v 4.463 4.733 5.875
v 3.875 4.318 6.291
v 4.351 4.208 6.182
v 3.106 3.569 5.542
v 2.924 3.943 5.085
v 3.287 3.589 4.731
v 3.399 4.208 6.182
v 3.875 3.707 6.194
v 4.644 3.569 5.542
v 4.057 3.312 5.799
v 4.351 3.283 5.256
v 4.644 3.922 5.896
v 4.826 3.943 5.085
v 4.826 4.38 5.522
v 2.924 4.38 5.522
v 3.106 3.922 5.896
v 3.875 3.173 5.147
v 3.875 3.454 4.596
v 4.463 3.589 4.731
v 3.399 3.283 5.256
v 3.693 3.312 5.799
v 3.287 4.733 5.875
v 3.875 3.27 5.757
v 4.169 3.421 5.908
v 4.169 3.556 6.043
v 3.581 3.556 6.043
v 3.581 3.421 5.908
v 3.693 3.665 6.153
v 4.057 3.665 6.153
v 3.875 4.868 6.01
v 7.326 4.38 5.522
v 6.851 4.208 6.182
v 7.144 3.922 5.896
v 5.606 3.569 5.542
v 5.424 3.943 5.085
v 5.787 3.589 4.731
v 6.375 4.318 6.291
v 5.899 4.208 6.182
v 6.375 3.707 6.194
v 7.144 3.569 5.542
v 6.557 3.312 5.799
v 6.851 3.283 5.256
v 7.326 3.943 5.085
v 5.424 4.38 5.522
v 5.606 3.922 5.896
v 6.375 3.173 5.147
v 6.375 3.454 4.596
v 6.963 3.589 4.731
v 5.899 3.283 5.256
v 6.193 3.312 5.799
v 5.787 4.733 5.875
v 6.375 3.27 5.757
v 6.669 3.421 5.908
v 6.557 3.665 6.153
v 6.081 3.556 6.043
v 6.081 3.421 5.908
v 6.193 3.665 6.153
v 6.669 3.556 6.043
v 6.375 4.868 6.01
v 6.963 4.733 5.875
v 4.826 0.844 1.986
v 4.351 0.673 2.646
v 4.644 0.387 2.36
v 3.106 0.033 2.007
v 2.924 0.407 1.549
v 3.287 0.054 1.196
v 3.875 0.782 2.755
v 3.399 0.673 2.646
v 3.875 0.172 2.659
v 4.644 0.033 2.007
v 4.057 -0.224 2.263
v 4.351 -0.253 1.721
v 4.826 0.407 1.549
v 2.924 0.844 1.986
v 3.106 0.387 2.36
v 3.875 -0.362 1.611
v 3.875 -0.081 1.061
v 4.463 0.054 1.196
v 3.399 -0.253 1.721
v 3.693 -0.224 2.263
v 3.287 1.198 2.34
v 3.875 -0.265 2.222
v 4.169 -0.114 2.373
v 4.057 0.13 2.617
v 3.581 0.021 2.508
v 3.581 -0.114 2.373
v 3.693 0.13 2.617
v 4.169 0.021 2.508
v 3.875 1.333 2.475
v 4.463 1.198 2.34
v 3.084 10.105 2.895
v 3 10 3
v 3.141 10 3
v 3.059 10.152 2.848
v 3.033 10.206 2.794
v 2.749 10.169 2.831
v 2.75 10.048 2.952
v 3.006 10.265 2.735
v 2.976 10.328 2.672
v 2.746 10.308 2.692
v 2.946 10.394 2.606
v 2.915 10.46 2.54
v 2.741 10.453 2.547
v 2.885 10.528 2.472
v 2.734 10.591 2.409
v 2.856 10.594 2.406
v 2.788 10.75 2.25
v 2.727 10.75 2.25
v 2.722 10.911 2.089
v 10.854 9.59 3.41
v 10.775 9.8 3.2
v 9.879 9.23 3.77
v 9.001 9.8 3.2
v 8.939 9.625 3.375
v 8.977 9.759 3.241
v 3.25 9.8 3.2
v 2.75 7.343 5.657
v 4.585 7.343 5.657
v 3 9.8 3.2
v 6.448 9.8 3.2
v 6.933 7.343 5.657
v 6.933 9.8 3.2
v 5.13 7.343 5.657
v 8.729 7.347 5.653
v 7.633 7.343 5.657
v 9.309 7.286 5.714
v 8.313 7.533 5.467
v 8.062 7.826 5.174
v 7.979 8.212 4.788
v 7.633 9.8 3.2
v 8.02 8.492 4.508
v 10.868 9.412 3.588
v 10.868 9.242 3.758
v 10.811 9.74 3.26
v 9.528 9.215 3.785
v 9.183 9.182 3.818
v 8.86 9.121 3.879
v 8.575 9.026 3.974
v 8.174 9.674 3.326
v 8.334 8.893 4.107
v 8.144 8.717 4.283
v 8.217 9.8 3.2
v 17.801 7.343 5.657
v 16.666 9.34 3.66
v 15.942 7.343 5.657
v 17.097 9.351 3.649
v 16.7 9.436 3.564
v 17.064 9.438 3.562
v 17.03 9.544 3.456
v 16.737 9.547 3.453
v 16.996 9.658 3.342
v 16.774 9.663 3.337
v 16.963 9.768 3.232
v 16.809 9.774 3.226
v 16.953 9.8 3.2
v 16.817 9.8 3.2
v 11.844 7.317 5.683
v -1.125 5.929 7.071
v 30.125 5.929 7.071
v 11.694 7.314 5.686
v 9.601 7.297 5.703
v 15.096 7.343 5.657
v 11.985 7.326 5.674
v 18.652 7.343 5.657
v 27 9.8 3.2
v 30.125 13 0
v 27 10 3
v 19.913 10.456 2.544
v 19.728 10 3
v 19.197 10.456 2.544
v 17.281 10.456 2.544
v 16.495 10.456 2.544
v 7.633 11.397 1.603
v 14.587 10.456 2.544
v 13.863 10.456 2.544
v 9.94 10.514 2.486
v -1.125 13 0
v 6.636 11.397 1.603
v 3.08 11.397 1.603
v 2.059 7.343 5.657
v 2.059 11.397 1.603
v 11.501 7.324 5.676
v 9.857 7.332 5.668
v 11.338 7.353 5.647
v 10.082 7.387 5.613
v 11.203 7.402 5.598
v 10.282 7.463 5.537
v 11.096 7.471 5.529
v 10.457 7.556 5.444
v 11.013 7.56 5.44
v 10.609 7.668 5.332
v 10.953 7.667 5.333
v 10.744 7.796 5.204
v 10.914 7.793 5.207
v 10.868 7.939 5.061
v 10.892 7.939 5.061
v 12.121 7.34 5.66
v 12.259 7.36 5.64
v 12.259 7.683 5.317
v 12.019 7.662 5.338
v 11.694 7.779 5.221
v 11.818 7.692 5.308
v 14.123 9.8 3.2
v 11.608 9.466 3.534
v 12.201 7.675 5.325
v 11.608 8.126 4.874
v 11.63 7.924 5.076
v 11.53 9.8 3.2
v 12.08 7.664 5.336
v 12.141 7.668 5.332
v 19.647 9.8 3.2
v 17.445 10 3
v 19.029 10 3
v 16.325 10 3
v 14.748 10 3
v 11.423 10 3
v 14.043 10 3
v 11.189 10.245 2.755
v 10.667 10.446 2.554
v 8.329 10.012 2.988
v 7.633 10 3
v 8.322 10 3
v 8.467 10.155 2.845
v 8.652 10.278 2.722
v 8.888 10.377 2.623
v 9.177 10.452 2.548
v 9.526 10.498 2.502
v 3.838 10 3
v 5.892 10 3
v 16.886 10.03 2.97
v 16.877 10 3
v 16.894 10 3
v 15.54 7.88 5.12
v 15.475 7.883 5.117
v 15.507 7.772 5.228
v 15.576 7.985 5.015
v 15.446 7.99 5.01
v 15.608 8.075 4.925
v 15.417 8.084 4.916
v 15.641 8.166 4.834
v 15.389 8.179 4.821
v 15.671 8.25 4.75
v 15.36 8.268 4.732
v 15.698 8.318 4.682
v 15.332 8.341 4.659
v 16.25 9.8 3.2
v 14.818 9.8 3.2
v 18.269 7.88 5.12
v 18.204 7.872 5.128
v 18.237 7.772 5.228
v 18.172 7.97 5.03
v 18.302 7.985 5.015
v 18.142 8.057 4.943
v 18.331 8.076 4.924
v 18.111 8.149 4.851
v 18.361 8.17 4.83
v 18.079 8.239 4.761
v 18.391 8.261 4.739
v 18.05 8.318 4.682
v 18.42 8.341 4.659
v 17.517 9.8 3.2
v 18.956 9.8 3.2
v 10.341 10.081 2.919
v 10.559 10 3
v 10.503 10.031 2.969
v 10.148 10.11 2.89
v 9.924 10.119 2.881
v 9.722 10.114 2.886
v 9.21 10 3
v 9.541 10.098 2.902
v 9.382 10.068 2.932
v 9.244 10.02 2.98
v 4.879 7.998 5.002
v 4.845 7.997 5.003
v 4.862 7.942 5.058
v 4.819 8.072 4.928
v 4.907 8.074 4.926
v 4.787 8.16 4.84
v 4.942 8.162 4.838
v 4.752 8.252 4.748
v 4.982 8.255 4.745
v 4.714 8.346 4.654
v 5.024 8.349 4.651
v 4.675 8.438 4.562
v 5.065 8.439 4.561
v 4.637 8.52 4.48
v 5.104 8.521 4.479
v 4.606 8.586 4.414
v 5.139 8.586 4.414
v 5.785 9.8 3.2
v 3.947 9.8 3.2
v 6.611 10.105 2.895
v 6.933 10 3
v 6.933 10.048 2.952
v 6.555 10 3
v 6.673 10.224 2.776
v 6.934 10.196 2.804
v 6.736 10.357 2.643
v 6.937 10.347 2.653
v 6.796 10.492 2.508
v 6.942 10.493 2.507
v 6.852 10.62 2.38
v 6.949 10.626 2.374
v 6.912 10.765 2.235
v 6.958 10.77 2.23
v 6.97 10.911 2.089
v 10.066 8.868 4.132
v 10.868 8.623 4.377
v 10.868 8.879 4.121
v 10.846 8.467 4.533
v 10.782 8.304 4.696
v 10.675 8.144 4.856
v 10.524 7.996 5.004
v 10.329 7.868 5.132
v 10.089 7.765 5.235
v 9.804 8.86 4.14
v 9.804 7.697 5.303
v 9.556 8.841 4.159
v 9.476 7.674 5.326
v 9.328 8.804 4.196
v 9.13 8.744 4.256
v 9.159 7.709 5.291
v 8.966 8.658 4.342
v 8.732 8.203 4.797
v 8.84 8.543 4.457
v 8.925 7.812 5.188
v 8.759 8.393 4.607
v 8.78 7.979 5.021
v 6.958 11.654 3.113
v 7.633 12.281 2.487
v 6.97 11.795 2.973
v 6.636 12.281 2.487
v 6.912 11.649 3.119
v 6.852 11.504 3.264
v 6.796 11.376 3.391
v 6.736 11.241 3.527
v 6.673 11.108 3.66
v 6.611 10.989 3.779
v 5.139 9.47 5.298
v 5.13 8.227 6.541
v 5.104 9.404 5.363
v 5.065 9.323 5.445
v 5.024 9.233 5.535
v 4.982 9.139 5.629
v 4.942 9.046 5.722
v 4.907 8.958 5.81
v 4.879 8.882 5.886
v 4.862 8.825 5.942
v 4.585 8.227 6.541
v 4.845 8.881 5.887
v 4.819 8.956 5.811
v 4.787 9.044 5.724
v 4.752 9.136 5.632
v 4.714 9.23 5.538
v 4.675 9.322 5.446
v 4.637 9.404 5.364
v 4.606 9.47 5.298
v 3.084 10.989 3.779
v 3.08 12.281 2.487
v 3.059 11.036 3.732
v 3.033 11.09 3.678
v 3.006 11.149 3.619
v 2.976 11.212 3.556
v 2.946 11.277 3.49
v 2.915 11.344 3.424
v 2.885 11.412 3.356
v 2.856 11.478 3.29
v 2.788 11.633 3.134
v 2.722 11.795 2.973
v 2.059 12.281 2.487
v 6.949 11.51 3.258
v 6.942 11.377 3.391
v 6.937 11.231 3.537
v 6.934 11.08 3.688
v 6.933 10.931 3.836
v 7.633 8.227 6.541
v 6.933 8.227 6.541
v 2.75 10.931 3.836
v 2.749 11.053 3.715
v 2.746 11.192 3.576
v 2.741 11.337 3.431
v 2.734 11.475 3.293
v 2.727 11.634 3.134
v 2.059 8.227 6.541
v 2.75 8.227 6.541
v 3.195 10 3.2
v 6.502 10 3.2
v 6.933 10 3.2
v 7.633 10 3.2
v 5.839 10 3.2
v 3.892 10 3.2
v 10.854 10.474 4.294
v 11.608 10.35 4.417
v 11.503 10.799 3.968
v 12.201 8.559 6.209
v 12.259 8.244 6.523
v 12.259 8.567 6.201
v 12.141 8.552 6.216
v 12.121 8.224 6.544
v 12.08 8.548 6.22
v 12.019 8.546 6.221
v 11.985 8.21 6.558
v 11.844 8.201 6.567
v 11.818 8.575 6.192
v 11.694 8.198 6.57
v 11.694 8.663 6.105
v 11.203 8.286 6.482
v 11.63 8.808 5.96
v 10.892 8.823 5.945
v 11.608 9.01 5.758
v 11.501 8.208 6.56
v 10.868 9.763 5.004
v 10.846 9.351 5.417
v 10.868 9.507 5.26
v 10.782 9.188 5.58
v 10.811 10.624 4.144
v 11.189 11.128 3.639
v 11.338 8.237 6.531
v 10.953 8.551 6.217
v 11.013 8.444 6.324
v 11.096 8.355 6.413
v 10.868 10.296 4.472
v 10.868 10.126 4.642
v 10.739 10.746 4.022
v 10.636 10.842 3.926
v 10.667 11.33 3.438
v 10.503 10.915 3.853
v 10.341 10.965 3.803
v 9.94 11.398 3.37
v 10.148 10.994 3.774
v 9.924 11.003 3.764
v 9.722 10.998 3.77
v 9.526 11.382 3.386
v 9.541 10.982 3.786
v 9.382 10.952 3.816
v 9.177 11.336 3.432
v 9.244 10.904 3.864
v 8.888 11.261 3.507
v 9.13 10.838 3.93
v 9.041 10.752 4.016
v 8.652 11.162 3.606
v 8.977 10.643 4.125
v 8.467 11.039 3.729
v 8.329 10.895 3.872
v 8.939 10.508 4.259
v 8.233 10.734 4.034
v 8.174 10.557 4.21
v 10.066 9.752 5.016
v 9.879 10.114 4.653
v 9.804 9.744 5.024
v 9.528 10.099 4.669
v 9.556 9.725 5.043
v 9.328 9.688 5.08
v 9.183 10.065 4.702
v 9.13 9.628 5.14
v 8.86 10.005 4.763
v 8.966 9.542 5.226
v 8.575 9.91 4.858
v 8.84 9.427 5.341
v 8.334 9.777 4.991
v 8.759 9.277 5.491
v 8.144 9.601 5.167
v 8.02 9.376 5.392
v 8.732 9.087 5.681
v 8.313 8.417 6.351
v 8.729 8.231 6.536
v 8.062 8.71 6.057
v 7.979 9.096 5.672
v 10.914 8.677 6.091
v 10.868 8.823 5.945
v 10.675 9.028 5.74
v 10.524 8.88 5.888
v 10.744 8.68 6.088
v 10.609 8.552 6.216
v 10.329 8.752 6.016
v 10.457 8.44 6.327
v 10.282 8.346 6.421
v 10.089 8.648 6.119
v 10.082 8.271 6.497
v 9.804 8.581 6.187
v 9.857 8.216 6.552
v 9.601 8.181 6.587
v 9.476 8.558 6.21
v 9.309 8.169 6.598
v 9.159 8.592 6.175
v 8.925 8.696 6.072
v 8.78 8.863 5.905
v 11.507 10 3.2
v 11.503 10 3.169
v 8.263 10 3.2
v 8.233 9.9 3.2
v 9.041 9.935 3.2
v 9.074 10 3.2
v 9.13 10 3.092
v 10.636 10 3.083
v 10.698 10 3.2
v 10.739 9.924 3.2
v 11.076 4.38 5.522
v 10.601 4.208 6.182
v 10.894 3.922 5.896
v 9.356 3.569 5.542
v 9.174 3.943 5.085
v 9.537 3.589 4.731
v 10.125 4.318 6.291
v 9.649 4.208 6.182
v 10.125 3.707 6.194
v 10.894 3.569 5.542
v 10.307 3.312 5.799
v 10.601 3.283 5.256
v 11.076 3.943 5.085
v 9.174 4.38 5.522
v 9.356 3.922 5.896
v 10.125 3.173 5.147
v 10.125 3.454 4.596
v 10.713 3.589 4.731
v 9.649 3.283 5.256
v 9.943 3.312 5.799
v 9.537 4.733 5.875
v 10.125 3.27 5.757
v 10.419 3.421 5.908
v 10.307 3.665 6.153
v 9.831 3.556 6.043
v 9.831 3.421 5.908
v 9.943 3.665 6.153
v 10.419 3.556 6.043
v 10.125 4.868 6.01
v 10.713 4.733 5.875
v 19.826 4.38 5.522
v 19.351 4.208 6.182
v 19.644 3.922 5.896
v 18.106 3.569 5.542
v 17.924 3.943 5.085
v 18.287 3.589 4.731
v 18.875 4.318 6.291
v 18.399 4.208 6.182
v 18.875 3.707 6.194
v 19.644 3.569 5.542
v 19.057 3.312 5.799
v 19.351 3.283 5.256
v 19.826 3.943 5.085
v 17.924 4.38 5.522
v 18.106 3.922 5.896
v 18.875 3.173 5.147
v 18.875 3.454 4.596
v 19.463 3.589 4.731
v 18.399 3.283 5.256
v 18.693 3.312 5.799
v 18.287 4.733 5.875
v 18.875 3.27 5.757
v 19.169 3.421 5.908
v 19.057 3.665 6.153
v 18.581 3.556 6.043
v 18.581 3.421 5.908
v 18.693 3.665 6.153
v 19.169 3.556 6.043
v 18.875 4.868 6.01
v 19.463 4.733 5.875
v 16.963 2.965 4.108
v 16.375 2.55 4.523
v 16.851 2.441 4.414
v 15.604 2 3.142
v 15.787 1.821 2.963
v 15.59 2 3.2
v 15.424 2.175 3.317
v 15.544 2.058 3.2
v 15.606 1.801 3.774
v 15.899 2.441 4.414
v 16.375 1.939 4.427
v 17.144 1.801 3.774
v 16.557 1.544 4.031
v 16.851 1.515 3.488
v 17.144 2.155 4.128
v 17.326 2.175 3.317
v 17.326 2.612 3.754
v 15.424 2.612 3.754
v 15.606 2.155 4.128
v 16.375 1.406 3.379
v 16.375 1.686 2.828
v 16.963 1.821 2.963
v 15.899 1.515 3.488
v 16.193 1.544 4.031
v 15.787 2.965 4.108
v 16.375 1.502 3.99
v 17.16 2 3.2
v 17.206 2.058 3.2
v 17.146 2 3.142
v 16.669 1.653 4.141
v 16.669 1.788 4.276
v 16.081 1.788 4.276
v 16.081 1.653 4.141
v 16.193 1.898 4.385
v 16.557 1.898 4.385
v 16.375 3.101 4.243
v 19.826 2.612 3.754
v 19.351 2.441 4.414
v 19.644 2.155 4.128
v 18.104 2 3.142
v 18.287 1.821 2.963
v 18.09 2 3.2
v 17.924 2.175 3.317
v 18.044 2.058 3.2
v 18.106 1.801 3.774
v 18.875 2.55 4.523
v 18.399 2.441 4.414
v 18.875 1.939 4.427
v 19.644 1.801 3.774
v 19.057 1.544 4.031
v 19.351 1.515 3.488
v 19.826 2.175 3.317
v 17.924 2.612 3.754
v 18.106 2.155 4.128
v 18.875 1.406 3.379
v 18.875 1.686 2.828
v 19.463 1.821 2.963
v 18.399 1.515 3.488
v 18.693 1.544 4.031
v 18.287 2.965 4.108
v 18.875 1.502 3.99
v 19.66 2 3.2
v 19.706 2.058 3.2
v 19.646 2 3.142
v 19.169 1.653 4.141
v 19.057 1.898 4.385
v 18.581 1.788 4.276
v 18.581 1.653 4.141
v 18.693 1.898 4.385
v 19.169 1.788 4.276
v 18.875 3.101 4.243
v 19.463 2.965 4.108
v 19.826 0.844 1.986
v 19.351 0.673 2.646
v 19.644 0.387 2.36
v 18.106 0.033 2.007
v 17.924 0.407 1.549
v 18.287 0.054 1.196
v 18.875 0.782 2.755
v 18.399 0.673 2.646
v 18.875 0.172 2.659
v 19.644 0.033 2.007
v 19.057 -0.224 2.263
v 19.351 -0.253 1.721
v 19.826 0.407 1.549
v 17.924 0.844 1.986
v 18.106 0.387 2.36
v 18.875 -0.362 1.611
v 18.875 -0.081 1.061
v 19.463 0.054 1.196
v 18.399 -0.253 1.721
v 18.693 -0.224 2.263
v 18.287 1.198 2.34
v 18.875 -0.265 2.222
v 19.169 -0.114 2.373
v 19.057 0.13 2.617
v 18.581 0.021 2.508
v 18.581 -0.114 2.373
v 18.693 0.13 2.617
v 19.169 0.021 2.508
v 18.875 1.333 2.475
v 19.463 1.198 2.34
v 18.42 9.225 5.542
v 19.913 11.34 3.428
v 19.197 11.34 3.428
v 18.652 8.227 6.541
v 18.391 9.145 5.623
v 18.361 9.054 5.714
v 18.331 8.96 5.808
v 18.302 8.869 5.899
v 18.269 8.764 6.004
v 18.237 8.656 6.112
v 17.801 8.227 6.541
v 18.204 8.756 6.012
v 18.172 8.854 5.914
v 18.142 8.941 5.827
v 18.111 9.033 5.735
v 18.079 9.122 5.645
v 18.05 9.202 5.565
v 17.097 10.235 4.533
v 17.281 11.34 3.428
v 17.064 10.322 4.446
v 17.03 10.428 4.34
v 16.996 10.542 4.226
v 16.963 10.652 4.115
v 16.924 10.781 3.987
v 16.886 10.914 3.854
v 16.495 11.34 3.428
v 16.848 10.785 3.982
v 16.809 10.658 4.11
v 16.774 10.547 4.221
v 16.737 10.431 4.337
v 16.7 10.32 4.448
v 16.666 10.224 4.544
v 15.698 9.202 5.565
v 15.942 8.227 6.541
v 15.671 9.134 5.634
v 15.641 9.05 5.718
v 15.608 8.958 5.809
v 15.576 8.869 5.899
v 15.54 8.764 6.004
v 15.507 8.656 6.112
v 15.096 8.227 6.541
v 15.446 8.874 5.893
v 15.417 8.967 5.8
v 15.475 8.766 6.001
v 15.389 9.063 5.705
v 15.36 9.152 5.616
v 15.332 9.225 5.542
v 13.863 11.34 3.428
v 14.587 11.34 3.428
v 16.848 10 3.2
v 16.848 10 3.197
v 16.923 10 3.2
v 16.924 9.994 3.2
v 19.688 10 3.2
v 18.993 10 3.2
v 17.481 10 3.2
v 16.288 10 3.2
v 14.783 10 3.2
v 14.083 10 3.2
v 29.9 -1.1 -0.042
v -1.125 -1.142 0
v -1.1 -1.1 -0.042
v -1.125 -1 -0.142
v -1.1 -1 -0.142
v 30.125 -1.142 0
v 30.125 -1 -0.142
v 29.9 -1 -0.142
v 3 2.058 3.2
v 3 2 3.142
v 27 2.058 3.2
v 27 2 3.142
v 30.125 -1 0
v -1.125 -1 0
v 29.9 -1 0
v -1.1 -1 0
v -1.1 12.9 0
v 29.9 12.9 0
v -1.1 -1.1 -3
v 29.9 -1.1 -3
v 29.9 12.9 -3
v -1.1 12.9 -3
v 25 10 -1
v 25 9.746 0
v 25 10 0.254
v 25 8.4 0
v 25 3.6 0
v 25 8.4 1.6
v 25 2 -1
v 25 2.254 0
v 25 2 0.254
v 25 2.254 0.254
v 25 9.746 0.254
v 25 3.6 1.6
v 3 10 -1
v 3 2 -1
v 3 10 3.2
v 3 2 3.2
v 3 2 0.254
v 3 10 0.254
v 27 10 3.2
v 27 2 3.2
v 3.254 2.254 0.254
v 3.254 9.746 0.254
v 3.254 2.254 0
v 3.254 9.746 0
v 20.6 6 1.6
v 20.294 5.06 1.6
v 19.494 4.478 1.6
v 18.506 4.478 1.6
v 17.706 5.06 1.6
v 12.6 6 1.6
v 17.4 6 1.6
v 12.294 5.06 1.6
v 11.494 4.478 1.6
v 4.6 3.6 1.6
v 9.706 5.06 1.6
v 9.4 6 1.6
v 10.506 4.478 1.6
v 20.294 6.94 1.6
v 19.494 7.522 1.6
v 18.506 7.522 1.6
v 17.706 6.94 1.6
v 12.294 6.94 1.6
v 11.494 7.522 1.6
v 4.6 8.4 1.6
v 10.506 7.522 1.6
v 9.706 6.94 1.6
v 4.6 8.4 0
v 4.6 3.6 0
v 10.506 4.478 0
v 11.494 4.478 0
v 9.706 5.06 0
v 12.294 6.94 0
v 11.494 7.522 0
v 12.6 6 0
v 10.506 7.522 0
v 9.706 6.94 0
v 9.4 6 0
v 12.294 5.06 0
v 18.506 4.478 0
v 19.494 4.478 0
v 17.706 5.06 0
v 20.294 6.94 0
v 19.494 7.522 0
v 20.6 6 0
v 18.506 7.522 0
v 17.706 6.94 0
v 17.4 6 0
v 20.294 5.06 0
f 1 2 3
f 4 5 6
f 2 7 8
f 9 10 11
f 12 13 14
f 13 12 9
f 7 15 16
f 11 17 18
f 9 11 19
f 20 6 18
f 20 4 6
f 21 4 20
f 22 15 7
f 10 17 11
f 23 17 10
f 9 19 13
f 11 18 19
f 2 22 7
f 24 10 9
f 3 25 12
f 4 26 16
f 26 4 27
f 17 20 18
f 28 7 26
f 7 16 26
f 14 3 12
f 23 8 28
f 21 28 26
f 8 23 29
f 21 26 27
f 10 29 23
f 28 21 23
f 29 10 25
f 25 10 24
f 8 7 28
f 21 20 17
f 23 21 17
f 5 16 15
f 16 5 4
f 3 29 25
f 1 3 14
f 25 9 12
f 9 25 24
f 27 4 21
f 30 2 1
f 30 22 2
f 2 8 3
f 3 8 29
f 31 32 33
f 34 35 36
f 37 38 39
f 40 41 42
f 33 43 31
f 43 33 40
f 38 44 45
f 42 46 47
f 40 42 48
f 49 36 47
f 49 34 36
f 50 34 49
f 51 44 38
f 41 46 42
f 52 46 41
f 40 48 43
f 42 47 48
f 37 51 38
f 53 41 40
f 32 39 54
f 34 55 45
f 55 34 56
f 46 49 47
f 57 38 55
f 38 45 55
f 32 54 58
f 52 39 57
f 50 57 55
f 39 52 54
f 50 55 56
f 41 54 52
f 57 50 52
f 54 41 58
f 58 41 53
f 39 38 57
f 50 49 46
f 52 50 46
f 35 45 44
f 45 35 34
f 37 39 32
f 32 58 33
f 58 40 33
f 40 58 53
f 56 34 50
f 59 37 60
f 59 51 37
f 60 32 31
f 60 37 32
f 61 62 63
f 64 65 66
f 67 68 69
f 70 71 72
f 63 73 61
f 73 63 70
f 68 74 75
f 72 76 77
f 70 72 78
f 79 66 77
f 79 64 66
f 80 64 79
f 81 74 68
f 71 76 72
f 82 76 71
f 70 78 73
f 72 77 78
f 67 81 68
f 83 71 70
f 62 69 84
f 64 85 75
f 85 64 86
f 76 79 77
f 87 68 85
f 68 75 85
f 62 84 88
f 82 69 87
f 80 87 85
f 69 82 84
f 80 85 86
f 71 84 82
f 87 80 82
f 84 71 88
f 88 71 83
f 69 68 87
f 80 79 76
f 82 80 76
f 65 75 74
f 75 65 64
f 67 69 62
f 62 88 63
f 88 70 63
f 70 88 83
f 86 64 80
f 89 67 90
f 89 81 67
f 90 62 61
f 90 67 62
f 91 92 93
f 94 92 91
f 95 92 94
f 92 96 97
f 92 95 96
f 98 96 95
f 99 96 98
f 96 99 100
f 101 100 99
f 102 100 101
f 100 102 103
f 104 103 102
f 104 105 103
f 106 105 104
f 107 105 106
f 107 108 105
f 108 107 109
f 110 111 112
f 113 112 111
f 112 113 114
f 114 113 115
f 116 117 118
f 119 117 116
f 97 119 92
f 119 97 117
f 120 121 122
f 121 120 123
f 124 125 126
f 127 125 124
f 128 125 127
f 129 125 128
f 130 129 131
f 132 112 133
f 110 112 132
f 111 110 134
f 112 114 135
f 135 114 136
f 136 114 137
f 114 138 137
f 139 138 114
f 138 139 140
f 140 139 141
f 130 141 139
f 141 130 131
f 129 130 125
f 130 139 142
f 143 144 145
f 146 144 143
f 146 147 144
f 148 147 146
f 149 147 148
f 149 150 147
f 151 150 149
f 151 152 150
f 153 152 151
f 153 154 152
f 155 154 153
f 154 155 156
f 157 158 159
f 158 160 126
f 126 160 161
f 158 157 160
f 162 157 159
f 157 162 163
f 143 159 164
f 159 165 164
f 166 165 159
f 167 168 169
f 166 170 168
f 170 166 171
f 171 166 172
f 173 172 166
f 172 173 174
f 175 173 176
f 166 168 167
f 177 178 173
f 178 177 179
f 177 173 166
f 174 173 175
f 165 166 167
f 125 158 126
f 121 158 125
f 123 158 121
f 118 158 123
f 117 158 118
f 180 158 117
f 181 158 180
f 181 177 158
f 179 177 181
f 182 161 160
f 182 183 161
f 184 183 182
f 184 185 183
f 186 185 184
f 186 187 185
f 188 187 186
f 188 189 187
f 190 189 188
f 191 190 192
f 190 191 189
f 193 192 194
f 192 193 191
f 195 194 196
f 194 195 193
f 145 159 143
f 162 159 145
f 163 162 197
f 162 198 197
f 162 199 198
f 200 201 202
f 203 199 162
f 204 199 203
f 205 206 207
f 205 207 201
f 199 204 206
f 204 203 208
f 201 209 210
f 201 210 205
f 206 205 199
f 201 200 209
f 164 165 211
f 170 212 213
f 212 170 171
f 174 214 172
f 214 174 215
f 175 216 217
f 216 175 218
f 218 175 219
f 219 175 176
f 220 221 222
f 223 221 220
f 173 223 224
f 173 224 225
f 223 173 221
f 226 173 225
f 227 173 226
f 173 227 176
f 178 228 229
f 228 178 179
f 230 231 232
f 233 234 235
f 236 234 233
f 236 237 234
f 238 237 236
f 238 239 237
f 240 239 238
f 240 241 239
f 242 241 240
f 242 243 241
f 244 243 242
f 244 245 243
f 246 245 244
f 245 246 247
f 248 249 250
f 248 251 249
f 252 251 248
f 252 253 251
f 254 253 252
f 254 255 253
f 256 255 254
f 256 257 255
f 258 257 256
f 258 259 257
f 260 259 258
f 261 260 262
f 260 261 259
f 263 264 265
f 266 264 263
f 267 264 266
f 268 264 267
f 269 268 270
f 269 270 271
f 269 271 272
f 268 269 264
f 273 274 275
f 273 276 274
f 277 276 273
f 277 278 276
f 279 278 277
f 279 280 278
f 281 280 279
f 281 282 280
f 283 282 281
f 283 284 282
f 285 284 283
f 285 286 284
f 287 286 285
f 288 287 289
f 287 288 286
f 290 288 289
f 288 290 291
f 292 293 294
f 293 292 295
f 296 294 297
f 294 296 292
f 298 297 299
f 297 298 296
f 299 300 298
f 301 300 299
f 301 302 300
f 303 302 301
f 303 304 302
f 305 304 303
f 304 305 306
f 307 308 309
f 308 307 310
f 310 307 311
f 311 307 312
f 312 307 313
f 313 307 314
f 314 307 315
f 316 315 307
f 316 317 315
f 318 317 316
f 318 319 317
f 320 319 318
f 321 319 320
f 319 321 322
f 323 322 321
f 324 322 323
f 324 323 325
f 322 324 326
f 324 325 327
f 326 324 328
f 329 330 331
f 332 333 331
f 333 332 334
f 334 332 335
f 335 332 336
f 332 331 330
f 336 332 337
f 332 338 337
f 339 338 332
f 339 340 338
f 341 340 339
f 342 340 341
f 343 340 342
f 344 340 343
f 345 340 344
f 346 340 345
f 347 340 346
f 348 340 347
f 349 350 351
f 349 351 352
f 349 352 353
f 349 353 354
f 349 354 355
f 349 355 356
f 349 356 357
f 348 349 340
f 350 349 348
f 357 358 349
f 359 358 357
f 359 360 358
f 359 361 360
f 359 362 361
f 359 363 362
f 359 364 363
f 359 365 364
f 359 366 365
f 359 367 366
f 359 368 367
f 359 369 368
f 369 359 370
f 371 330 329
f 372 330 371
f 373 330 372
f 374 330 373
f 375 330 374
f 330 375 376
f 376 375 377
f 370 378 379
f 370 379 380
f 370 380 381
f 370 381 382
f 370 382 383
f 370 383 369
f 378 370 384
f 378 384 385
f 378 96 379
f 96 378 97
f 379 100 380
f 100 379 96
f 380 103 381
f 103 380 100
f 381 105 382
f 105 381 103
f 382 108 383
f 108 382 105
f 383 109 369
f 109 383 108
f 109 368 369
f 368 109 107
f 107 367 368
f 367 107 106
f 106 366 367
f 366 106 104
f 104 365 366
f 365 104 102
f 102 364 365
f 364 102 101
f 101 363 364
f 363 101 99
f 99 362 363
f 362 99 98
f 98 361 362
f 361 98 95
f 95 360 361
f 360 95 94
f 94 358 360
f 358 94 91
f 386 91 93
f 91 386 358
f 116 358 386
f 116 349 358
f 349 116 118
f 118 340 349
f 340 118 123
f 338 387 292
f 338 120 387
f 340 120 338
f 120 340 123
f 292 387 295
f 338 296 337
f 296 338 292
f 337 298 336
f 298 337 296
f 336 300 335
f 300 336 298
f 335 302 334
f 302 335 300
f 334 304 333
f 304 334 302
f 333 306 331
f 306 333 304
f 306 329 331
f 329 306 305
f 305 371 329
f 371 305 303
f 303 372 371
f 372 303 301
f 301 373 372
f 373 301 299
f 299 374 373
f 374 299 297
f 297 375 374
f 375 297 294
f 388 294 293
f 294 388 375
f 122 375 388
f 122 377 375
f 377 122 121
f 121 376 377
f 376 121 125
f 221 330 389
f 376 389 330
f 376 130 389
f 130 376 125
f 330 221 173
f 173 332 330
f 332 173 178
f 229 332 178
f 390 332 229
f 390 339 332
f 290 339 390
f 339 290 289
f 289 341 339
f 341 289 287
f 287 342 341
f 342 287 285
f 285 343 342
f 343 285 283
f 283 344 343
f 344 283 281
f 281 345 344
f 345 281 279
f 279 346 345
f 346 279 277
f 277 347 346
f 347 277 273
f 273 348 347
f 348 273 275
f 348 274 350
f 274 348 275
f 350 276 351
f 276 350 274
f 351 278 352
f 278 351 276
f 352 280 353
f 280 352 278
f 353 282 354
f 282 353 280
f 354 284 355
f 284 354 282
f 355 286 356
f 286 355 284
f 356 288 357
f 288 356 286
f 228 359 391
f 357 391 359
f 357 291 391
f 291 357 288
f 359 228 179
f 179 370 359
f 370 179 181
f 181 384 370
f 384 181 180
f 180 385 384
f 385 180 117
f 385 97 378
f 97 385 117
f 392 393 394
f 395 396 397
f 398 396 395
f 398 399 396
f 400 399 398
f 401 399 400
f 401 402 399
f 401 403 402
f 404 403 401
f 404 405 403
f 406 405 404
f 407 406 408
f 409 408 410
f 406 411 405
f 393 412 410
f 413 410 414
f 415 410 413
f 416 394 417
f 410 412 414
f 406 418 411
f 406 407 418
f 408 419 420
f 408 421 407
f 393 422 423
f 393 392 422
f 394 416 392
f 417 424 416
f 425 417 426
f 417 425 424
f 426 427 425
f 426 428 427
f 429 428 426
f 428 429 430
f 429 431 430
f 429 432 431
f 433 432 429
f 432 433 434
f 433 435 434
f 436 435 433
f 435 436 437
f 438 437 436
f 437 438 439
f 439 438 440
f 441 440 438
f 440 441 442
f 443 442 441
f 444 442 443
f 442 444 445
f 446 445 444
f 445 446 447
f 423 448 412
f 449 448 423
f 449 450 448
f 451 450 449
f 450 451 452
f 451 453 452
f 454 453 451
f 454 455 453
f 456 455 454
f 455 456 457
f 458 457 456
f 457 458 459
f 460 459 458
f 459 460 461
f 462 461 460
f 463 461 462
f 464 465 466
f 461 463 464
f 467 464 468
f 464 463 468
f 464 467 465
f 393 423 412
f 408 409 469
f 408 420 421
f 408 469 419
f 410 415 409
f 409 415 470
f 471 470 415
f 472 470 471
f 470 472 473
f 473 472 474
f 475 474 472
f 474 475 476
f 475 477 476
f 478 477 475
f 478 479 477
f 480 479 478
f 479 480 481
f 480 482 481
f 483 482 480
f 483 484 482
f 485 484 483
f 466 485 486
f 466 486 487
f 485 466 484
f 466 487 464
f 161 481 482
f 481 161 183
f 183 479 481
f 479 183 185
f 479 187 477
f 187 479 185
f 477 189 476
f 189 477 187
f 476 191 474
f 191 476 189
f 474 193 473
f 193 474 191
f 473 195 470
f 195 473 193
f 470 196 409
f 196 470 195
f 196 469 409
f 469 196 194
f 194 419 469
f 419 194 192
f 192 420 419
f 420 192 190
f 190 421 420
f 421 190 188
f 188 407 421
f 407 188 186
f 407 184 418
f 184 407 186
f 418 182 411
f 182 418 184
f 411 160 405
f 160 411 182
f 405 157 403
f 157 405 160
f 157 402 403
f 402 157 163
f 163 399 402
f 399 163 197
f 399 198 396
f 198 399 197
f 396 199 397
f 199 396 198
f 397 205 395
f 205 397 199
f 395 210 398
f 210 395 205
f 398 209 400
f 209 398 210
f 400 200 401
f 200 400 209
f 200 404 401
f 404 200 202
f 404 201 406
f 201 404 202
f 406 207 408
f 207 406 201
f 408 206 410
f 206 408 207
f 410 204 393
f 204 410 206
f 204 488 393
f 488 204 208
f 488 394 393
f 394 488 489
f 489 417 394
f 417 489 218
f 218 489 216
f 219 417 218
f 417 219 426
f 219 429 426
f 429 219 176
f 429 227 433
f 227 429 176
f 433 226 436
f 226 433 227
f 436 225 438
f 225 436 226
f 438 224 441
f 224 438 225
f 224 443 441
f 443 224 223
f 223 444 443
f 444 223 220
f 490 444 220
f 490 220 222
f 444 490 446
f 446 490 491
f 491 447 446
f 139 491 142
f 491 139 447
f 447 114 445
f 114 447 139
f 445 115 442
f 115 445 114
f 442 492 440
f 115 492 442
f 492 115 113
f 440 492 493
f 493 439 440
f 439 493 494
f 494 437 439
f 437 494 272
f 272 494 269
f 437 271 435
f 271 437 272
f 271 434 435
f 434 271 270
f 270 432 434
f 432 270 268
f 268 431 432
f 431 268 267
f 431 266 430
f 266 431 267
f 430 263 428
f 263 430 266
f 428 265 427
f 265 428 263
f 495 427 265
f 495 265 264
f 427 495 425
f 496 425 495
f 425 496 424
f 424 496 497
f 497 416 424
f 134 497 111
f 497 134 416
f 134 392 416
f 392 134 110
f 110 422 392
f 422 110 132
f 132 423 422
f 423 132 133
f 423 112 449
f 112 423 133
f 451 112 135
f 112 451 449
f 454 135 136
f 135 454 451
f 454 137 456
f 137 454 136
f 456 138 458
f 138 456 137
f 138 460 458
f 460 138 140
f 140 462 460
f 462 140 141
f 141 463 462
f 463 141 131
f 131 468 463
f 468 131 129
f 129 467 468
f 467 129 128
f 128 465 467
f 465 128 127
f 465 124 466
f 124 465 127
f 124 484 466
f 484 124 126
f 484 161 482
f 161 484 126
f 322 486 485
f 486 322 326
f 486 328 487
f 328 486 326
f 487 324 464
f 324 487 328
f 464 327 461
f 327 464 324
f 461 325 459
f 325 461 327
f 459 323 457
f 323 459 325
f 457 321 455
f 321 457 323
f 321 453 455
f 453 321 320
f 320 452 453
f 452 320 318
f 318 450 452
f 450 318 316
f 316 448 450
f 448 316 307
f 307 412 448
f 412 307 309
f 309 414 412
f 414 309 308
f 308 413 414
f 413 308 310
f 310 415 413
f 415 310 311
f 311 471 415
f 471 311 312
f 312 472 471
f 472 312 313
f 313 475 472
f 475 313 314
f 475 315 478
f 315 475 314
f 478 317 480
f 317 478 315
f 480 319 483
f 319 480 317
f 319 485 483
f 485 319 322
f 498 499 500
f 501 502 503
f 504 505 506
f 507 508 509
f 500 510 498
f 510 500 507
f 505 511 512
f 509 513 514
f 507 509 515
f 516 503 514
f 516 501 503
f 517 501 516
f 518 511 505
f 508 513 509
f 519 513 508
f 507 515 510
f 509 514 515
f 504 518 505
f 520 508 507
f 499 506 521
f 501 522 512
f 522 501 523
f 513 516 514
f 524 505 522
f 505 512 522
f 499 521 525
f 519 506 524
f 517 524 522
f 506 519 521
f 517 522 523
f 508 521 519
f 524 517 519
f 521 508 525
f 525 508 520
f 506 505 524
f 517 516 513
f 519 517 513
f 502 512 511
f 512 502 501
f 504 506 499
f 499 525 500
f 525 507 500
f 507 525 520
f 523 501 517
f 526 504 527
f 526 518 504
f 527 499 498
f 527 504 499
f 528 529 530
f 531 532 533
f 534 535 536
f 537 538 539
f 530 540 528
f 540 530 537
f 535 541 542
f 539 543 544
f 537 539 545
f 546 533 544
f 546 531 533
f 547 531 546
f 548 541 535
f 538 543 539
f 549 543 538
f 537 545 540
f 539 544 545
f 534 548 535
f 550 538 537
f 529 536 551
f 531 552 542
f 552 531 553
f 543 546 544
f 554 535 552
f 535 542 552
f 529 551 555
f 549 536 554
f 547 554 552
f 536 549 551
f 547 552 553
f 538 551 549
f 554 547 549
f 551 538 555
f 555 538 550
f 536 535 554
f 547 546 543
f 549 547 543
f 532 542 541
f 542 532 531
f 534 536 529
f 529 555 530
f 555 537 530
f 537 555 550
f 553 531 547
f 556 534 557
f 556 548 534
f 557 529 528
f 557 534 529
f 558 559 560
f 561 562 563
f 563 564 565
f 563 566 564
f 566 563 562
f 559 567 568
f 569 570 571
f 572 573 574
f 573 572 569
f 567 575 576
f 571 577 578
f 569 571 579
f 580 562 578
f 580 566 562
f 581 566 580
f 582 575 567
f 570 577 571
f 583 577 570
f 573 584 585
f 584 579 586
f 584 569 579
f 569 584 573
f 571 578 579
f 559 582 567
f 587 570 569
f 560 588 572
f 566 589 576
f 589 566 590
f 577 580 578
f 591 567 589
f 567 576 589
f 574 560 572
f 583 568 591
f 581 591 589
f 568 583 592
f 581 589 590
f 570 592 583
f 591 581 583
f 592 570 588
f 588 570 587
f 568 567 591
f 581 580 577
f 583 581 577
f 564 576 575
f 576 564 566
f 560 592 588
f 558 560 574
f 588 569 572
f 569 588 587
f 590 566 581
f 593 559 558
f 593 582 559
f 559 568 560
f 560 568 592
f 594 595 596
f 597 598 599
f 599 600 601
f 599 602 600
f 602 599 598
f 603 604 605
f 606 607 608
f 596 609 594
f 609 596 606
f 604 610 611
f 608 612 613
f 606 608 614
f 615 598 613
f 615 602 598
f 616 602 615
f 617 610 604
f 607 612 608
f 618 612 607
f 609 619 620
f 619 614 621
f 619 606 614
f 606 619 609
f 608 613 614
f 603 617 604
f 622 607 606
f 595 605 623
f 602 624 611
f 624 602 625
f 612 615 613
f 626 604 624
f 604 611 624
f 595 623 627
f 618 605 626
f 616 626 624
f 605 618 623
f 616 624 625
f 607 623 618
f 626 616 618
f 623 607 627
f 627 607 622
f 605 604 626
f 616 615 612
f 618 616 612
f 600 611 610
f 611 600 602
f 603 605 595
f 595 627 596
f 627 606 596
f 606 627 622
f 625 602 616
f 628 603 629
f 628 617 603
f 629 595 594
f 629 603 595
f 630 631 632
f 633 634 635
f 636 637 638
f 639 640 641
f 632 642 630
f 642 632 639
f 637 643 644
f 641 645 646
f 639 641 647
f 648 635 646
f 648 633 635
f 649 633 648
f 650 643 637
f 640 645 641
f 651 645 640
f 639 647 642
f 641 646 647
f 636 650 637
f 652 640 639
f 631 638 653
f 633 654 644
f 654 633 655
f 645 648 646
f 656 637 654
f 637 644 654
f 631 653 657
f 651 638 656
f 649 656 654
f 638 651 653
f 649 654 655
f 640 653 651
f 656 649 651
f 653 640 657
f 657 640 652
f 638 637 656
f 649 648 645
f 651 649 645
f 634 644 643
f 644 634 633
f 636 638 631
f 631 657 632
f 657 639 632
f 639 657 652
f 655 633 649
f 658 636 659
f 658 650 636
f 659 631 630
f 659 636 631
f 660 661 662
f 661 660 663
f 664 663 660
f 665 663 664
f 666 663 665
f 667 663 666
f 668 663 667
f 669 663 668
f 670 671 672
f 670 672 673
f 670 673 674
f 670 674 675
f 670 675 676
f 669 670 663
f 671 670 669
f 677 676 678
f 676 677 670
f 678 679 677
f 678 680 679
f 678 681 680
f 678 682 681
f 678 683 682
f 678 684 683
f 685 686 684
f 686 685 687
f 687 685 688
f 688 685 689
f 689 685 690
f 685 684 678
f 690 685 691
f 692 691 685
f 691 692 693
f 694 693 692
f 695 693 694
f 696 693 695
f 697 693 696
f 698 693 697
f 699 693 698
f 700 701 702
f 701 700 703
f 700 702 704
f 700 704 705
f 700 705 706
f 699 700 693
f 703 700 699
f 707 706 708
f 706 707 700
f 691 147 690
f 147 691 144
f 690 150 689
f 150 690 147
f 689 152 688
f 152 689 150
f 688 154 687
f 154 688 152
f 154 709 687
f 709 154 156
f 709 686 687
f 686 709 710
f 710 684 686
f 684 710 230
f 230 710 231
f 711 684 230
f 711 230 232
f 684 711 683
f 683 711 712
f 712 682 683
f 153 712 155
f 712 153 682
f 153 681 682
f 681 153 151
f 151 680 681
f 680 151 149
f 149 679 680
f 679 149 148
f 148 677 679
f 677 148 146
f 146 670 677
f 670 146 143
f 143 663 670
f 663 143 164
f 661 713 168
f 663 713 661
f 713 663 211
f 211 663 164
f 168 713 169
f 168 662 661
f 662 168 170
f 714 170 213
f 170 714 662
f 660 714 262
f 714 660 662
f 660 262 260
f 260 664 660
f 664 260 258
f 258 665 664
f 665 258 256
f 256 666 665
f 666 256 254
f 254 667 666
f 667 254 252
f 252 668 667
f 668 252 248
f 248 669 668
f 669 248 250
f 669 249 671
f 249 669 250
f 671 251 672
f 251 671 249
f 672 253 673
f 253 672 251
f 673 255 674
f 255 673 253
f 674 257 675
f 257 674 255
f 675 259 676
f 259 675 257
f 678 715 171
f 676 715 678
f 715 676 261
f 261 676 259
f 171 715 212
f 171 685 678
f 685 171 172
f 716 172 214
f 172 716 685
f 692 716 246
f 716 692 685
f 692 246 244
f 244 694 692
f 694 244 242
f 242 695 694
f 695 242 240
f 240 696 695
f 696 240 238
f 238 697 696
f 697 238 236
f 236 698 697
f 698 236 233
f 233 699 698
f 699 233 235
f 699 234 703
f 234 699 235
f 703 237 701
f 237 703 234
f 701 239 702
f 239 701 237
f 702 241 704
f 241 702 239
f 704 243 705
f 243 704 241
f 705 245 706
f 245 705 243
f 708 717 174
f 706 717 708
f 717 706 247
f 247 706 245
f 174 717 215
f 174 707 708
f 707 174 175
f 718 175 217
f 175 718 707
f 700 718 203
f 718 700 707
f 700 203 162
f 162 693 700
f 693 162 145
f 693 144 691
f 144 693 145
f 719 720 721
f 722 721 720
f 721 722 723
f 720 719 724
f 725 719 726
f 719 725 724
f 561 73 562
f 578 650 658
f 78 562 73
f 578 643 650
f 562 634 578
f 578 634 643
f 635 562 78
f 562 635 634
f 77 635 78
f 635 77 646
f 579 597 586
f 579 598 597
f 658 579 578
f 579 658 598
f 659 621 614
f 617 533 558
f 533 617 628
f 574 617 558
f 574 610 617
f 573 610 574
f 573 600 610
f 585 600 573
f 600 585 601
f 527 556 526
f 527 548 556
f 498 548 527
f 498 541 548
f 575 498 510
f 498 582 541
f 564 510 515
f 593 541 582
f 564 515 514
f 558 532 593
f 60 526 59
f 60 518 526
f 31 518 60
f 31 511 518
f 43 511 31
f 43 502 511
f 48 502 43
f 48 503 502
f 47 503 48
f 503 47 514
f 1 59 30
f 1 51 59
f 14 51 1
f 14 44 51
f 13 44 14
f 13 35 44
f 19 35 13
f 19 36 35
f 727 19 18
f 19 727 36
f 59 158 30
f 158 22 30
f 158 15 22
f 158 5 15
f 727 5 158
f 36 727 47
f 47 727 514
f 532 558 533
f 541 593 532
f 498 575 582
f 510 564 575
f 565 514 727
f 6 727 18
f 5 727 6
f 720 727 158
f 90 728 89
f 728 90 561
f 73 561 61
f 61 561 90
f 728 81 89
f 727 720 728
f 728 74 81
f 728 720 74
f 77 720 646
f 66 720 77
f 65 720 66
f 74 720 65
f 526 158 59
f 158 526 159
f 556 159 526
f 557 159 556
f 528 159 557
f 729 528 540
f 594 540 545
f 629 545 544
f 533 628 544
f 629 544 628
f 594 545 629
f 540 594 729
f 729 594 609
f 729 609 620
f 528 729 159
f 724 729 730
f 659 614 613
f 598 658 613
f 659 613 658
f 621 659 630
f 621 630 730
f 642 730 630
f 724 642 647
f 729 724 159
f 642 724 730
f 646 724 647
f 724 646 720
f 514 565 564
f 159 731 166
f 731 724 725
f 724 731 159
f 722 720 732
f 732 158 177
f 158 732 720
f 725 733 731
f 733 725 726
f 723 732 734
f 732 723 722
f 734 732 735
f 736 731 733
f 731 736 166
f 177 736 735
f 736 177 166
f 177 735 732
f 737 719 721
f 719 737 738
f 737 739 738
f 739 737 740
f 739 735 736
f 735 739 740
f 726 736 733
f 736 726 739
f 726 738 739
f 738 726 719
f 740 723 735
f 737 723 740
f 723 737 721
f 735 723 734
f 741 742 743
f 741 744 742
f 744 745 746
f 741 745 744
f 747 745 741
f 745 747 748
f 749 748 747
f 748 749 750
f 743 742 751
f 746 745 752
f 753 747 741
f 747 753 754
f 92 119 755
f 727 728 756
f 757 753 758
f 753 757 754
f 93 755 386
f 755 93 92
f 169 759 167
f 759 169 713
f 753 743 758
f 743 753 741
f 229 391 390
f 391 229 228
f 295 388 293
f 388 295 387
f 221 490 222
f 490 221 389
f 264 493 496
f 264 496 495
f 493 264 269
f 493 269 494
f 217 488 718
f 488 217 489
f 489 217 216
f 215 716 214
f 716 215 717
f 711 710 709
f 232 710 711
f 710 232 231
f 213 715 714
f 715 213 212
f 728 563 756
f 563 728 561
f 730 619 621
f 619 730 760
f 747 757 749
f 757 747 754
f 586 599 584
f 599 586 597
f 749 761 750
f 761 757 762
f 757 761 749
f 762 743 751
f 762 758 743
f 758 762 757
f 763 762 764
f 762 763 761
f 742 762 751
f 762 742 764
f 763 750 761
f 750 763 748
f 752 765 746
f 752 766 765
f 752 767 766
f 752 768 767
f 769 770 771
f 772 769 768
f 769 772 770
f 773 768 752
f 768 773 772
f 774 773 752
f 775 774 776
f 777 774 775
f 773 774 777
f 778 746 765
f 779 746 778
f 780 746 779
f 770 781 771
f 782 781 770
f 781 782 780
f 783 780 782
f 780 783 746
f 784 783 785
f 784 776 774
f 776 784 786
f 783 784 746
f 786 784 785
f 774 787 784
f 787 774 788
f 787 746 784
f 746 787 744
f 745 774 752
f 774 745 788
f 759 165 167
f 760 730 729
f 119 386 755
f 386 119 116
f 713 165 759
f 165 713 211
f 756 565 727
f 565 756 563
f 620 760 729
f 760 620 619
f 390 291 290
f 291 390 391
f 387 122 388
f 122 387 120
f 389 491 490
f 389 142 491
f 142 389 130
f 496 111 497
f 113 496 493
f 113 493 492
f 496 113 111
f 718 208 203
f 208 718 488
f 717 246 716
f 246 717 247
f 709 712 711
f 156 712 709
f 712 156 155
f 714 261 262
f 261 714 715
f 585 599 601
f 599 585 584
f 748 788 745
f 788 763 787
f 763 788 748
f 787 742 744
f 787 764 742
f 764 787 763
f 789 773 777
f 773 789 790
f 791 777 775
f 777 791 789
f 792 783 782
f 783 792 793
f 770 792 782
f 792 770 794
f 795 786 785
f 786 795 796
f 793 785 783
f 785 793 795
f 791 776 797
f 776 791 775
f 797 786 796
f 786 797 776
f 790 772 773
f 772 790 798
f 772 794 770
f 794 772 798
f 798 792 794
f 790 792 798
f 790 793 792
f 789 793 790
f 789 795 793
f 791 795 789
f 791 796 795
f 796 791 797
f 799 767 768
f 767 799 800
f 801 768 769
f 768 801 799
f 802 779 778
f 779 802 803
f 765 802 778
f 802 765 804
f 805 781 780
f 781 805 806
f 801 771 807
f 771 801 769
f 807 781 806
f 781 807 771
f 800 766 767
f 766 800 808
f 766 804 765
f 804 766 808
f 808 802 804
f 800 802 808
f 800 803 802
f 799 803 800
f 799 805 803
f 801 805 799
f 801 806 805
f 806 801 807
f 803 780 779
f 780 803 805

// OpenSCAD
// file: ../OpenSCAD/brailleAndText.scad
/*
Braille Module
http://creativecommons.org/licenses/by/3.0/
*/


// mm sizes from http://dots.physics.orst.edu/gs_layout.html
radius = 0.25;
spacing = 2.5;
startOffset = 3.75;
distance = startOffset + spacing;

plate_height = 10;
plate_thickness = 10;   // was 2.

$fn = 10;



module letter(bitmap, char) {
//    echo(char);
	row_size = 2;
	col_size = 3;
	bitmap_size = row_size * col_size;
	
	function loc_x(loc) = floor(loc / row_size) * spacing + spacing;
	function loc_y(loc) = loc % row_size * spacing  + (distance-spacing)/2;

    translate([0, loc_y(-1), -2]) {
        rotate([270, 0, 90]) {
            linear_extrude(height = 1.25)
            text(char, 6);
        }
    }
	
    for (loc = [0:bitmap_size - 1]) {
		if (bitmap[loc] != 0) {
			union() {
				translate(v = [loc_x(loc), loc_y(loc), 0]) {
					sphere(radius = radius* bitmap[loc], center = true);
				}
			}
		}
	}
}


module braille_char(char) {
	if (char == "A" || char == "a") {
		letter([
			1,0,
			0,0,
			0,0
		], char);
	} else if (char == "B" || char == "b") {
		letter([
			1,0,
			1,0,
			0,0
		], char);
	} else if (char == "C" || char == "c") {
		letter([
			1,1,
			0,0,
			0,0
		], char);
	} else if (char == "D" || char == "d") {
		letter([
			1,1,
			0,1,
			0,0
		], char);
	} else if (char == "E" || char == "e") {
		letter([
			1,0,
			0,1,
			0,0
		], char);
	} else if (char == "F" || char == "f") {
		letter([
			1,1,
			1,0,
			0,0
		], char);
	} else if (char == "G" || char == "g") {
		letter([
			1,1,
			1,1,
			0,0
		], char);
	} else if (char == "H" || char == "h") {
		letter([
			1,0,
			1,1,
			0,0
		], char);
	} else if (char == "I" || char == "i") {
		letter([
			0,1,
			1,0,
			0,0
		], char);
	} else if (char == "J" || char == "j") {
		letter([
			0,1,
			1,1,
			0,0
		], char);
	} else if (char == "K" || char == "k") {
		letter([
			1,0,
			0,0,
			1,0
		], char);
	} else if (char == "L" || char == "l") {
		letter([
			1,0,
			1,0,
			1,0
		], char);
	} else if (char == "M" || char == "m") {
		letter([
			1,1,
			0,0,
			1,0
		], char);
	} else if (char == "N" || char == "n") {
		letter([
			1,1,
			0,1,
			1,0
		], char);
	} else if (char == "O" || char == "o") {
		letter([
			1,0,
			0,1,
			1,0
		], char);
	} else if (char == "P" || char == "p") {
		letter([
			1,1,
			1,0,
			1,0
		], char);
	} else if (char == "Q" || char == "q") {
		letter([
			1,1,
			1,1,
			1,0
		], char);
	} else if (char == "R" || char == "r") {
		letter([
			1,0,
			1,1,
			1,0
		], char);
	} else if (char == "S" || char == "s") {
		letter([
			0,1,
			1,0,
			1,0
		], char);
	} else if (char == "T" || char == "t") {
		letter([
			0,1,
			1,1,
			1,0
		], char);
	} else if (char == "U" || char == "u") {
		letter([
			1,0,
			0,0,
			1,1
		], char);
	} else if (char == "V" || char == "v") {
		letter([
			1,0,
			1,1,
			1,0
		], char);
	} else if (char == "W" || char == "w") {
		letter([
			0,1,
			1,1,
			0,1
		], char);
	} else if (char == "X" || char == "x") {
		letter([
			1,1,
			0,0,
			1,1
		], char);
	} else if (char == "Y" || char == "y") {
		letter([
			1,1,
			0,1,
			1,1
		], char);
	} else if (char == "Z" || char == "z") {
		letter([
			1,0,
			0,1,
			1,1
		], char);
    } else if (char == " ") {
		letter([
			0,0,
			0,0,
			0,0
		], char);
	} else {
		echo("Invalid Character: ", char);
	}

}

module braille_str(chars) {
    char_count = len(chars);
	echo(str("Total Width of ", chars, " : ",  distance * char_count, "mm"));
	union() {
		for (count = [0:char_count-1]) {
			translate(v = [0, count * distance, plate_thickness]) {
				braille_char(chars[count]);
			}
		}
		translate(v = [0, -distance/2, 0]) {
			color([0,0,1]) {
				cube(size = [plate_height, distance * (char_count+1), plate_thickness]);
			}
            }                                                      
	}
}

function lenText(txt="Hi") = distance * len(txt);

module printTextAndBraille(textToPrint) {
    blockLen = lenText(textToPrint);
    union()
    {
        difference() {                      // remove second box from first
            rotate([0,45,0]) {              // make it on its edge
                braille_str((textToPrint)); // make a long box
            }
            translate([0, -3.25, -8]) {     // move in right place
                cube(size = [14, (blockLen+8), 8]);
            }
        } 
        translate([0.1, -3.1, -3]) {     // move in right place
            cube(size = [14, (blockLen+6), 3]); 
        }
    }                                 
}

printTextAndBraille("HELLO CalLUM");
// file: ../openSCADLibs/lego_brick_builder.scad
/*

 Basic Lego brick builder module for OpenScad by Jorg Janssen 2013 (CC BY-NC 3.0) 
 To use this in your own projects add:

 use <path_to_this_file/lego_brick_builder.scad>
 brick (length, width, height [,smooth]);

 Length and width are in standard lego brick dimensions. 
 Height is in flat brick heights, so for a normal lego brick height = 3.
 Add optional smooth = true for a brick without studs. 
 Use height = 0 to just put studs/knobs on top of other things.

 */
$fn = 150;

// and this is how it's done:

FLU = 1.6; // Fundamental Lego Unit = 1.6 mm

BRICK_WIDTH = 5*FLU; // basic brick width
BRICK_HEIGHT = 6*FLU; // basic brick height
PLATE_HEIGHT = 2*FLU; // basic plate height
WALL_THICKNESS = FLU; // outer wall of the brick
STUD_RADIUS = 1.5*FLU; // studs are the small cylinders on top of the brick with the lego logo ('nopje' in Dutch)
STUD_HEIGHT = FLU; 
ANTI_STUD_RADIUS = 0.5*4.07*FLU;  // an anti stud is the hollow cylinder inside bricks that have length > 1 and width > 1
PIN_RADIUS = FLU; // a pin is the small cylinder inside bricks that have length = 1 or width = 1
SUPPORT_THICKNESS = 0.254; // support is the thin surface between anti studs, pins and walls, your printer might not print this thin, try thicker!
EDGE = 0.254; // this is the width and height of the bottom line edge of smooth bricks
CORRECTION = 0.1; // addition to each size, to make sure all parts connect by moving them a little inside each other

module brick(length = 4, width = 2, height = 3, smooth = false){

	// brick shell
	difference(){
		cube(size = [length*BRICK_WIDTH,width*BRICK_WIDTH,height*PLATE_HEIGHT]);
		translate([WALL_THICKNESS,WALL_THICKNESS,-WALL_THICKNESS])
		union(){
			cube(size = [length*BRICK_WIDTH-2*WALL_THICKNESS,width*BRICK_WIDTH-2*WALL_THICKNESS,height*PLATE_HEIGHT]);
			// stud inner holes, radius = pin radius
			if (!smooth) {
				translate([STUD_RADIUS+WALL_THICKNESS,STUD_RADIUS+WALL_THICKNESS,height*PLATE_HEIGHT])
				for (y = [0:width-1]){
					for (x = [0:length-1]){
						translate ([x*BRICK_WIDTH-WALL_THICKNESS,y*BRICK_WIDTH-WALL_THICKNESS,-CORRECTION])
						cylinder(h=WALL_THICKNESS+2*CORRECTION,r=PIN_RADIUS);
					}
				}
			}
			// small bottom line edge for smooth bricks
			else {
				translate([-WALL_THICKNESS-CORRECTION,-WALL_THICKNESS-CORRECTION,FLU-CORRECTION]) 
				difference() {
					cube([length*BRICK_WIDTH+2*CORRECTION,width*BRICK_WIDTH+2*CORRECTION,EDGE+CORRECTION]);
					translate([EDGE+CORRECTION,EDGE+CORRECTION,-CORRECTION])
					cube([length*BRICK_WIDTH-2*EDGE,width*BRICK_WIDTH-2*EDGE,EDGE+3*CORRECTION]); 
				}
			}
		}
	}
	// Studs
	if(!smooth){
		translate([STUD_RADIUS+WALL_THICKNESS,STUD_RADIUS+WALL_THICKNESS,height*PLATE_HEIGHT])
		for (y = [0:width-1]){
			for (x = [0:length-1]){
				translate ([x*BRICK_WIDTH,y*BRICK_WIDTH,-CORRECTION])
				difference(){
					cylinder(h=STUD_HEIGHT+CORRECTION, r=STUD_RADIUS);
					// Stud inner holes
					translate([0,0,-CORRECTION])
					cylinder(h=0.5*STUD_HEIGHT+CORRECTION,r=PIN_RADIUS);
				}
				// tech logo - disable this if your printer isn't capable of printing this small
				if ( length > width){
					translate([x*BRICK_WIDTH+0.8,y*BRICK_WIDTH-1.9,STUD_HEIGHT-CORRECTION])
					resize([1.2*1.7,2.2*1.7,0.254+CORRECTION])
					rotate(a=[0,0,90])
					import("tech.stl");
				}
				else {
					translate([x*BRICK_WIDTH-1.9,y*BRICK_WIDTH-0.8,STUD_HEIGHT-CORRECTION])
					resize([2.2*1.7,1.2*1.7,0.254+CORRECTION])
					import("tech.stl");				
				}				
				/* 
				// Alternative 2-square logo
				translate ([x*BRICK_WIDTH+CORRECTION,y*BRICK_WIDTH-CORRECTION,STUD_HEIGHT-CORRECTION])		
				cube([1,1,2*CORRECTION]);
				translate ([x*BRICK_WIDTH-0.9,y*BRICK_WIDTH-0.9,STUD_HEIGHT-CORRECTION])		
				cube([1,1,0.3]);
				*/				
			}
		}
	}
	// Pins x
	if (width == 1 && length > 1) {	
			for (x = [1:length-1]){
				translate([x*BRICK_WIDTH,0.5*BRICK_WIDTH,0])
				cylinder(h=height*PLATE_HEIGHT-WALL_THICKNESS+CORRECTION,r=PIN_RADIUS);
				// Supports
				if (height > 1) {
				translate([x*BRICK_WIDTH-0.5*SUPPORT_THICKNESS,CORRECTION,STUD_HEIGHT])
				cube(size=[SUPPORT_THICKNESS,BRICK_WIDTH-2*CORRECTION,height*PLATE_HEIGHT-STUD_HEIGHT-WALL_THICKNESS+CORRECTION]);
			}
		}
	}
	// Pins y
	if (length == 1 && width > 1) {	
			for (y = [1:width-1]){
			translate([0.5*BRICK_WIDTH,y*BRICK_WIDTH,0])
			cylinder(h=height*PLATE_HEIGHT-WALL_THICKNESS+CORRECTION,r=PIN_RADIUS);
			// Supports
			if (height > 1) {
			translate([CORRECTION,y*BRICK_WIDTH-0.5*SUPPORT_THICKNESS,STUD_HEIGHT])
			cube(size=[BRICK_WIDTH-2*CORRECTION,SUPPORT_THICKNESS,height*PLATE_HEIGHT-STUD_HEIGHT-WALL_THICKNESS+CORRECTION]);}
			
		}
	}
	// Anti Studs
	if (width > 1 && length > 1){
		difference(){
			union(){
				for(y = [1:width-1]){
					for(x = [1:length-1]){
						// anti studs
						translate([x*BRICK_WIDTH,y*BRICK_WIDTH,0])
						cylinder (h=height*PLATE_HEIGHT-WALL_THICKNESS+CORRECTION, r = ANTI_STUD_RADIUS);
						// Supports
						if (height > 1){
							// Support x
							if (x%2 == 0 && (length%2 == 0 || length%4 == 1 && x<length/2 || length%4 == 3 && x>length/2) || x%2 == 1 && (length%4 == 3 && x<length/2 || length%4 == 1 && x>length/2)) {
								translate([BRICK_WIDTH*x-0.5*SUPPORT_THICKNESS,y*BRICK_WIDTH-BRICK_WIDTH+WALL_THICKNESS-CORRECTION,STUD_HEIGHT])
								cube(size=[SUPPORT_THICKNESS,2*BRICK_WIDTH-2*WALL_THICKNESS,height*PLATE_HEIGHT-STUD_HEIGHT-WALL_THICKNESS+CORRECTION]);
							}
							// Supports y							
							if (y%2 == 0 && (width%2 == 0 || width%4 == 1 && y<width/2 || width%4 == 3 && y>width/2) || y%2 == 1 && (width%4 == 3 && y<width/2 || width%4 == 1 && y>width/2)) {
								translate([x*BRICK_WIDTH-BRICK_WIDTH+WALL_THICKNESS-CORRECTION,BRICK_WIDTH*y-0.5*SUPPORT_THICKNESS,STUD_HEIGHT])
								cube(size=[2*BRICK_WIDTH-2*WALL_THICKNESS,SUPPORT_THICKNESS,height*PLATE_HEIGHT-STUD_HEIGHT-WALL_THICKNESS+CORRECTION]);
							}
						}
					}
				}
			}
			union(){
				for(y = [1:width-1]){
					for(x = [1:length-1]){
						// hollow anti studs
						translate([x*BRICK_WIDTH,y*BRICK_WIDTH,-WALL_THICKNESS])
						cylinder (h=height*PLATE_HEIGHT, r = STUD_RADIUS);				
					}
				}
			}
		}		
	}
}
	
// file: ../OpenSCAD/TextAndBrailleLegoBlock.scad
 include <../openSCADLibs/lego_brick_builder.scad>
 include <../OpenSCAD/brailleAndText.scad>;

module brickAndText(text) {
    txtLen = distance * len(text);
    echo(distance);
    difference() {
        rotate([180,180,90])
            translate([-13, 2, 0])
                printTextAndBraille(text);
        translate([3, 2, -1]) 
            cube([txtLen - 3, BRICK_WIDTH, 4]);
    }
    translate([3,2,0])
        brick(floor(txtLen / BRICK_WIDTH),1,1, true);    
}

// use <../BPNodesV2/TextNBraille.scad>
//brickAndText("This is a test string");  
// main file
use <../OpenSCAD/TextAndBrailleLegoBlock.scad>

brickAndText("Maw2");
